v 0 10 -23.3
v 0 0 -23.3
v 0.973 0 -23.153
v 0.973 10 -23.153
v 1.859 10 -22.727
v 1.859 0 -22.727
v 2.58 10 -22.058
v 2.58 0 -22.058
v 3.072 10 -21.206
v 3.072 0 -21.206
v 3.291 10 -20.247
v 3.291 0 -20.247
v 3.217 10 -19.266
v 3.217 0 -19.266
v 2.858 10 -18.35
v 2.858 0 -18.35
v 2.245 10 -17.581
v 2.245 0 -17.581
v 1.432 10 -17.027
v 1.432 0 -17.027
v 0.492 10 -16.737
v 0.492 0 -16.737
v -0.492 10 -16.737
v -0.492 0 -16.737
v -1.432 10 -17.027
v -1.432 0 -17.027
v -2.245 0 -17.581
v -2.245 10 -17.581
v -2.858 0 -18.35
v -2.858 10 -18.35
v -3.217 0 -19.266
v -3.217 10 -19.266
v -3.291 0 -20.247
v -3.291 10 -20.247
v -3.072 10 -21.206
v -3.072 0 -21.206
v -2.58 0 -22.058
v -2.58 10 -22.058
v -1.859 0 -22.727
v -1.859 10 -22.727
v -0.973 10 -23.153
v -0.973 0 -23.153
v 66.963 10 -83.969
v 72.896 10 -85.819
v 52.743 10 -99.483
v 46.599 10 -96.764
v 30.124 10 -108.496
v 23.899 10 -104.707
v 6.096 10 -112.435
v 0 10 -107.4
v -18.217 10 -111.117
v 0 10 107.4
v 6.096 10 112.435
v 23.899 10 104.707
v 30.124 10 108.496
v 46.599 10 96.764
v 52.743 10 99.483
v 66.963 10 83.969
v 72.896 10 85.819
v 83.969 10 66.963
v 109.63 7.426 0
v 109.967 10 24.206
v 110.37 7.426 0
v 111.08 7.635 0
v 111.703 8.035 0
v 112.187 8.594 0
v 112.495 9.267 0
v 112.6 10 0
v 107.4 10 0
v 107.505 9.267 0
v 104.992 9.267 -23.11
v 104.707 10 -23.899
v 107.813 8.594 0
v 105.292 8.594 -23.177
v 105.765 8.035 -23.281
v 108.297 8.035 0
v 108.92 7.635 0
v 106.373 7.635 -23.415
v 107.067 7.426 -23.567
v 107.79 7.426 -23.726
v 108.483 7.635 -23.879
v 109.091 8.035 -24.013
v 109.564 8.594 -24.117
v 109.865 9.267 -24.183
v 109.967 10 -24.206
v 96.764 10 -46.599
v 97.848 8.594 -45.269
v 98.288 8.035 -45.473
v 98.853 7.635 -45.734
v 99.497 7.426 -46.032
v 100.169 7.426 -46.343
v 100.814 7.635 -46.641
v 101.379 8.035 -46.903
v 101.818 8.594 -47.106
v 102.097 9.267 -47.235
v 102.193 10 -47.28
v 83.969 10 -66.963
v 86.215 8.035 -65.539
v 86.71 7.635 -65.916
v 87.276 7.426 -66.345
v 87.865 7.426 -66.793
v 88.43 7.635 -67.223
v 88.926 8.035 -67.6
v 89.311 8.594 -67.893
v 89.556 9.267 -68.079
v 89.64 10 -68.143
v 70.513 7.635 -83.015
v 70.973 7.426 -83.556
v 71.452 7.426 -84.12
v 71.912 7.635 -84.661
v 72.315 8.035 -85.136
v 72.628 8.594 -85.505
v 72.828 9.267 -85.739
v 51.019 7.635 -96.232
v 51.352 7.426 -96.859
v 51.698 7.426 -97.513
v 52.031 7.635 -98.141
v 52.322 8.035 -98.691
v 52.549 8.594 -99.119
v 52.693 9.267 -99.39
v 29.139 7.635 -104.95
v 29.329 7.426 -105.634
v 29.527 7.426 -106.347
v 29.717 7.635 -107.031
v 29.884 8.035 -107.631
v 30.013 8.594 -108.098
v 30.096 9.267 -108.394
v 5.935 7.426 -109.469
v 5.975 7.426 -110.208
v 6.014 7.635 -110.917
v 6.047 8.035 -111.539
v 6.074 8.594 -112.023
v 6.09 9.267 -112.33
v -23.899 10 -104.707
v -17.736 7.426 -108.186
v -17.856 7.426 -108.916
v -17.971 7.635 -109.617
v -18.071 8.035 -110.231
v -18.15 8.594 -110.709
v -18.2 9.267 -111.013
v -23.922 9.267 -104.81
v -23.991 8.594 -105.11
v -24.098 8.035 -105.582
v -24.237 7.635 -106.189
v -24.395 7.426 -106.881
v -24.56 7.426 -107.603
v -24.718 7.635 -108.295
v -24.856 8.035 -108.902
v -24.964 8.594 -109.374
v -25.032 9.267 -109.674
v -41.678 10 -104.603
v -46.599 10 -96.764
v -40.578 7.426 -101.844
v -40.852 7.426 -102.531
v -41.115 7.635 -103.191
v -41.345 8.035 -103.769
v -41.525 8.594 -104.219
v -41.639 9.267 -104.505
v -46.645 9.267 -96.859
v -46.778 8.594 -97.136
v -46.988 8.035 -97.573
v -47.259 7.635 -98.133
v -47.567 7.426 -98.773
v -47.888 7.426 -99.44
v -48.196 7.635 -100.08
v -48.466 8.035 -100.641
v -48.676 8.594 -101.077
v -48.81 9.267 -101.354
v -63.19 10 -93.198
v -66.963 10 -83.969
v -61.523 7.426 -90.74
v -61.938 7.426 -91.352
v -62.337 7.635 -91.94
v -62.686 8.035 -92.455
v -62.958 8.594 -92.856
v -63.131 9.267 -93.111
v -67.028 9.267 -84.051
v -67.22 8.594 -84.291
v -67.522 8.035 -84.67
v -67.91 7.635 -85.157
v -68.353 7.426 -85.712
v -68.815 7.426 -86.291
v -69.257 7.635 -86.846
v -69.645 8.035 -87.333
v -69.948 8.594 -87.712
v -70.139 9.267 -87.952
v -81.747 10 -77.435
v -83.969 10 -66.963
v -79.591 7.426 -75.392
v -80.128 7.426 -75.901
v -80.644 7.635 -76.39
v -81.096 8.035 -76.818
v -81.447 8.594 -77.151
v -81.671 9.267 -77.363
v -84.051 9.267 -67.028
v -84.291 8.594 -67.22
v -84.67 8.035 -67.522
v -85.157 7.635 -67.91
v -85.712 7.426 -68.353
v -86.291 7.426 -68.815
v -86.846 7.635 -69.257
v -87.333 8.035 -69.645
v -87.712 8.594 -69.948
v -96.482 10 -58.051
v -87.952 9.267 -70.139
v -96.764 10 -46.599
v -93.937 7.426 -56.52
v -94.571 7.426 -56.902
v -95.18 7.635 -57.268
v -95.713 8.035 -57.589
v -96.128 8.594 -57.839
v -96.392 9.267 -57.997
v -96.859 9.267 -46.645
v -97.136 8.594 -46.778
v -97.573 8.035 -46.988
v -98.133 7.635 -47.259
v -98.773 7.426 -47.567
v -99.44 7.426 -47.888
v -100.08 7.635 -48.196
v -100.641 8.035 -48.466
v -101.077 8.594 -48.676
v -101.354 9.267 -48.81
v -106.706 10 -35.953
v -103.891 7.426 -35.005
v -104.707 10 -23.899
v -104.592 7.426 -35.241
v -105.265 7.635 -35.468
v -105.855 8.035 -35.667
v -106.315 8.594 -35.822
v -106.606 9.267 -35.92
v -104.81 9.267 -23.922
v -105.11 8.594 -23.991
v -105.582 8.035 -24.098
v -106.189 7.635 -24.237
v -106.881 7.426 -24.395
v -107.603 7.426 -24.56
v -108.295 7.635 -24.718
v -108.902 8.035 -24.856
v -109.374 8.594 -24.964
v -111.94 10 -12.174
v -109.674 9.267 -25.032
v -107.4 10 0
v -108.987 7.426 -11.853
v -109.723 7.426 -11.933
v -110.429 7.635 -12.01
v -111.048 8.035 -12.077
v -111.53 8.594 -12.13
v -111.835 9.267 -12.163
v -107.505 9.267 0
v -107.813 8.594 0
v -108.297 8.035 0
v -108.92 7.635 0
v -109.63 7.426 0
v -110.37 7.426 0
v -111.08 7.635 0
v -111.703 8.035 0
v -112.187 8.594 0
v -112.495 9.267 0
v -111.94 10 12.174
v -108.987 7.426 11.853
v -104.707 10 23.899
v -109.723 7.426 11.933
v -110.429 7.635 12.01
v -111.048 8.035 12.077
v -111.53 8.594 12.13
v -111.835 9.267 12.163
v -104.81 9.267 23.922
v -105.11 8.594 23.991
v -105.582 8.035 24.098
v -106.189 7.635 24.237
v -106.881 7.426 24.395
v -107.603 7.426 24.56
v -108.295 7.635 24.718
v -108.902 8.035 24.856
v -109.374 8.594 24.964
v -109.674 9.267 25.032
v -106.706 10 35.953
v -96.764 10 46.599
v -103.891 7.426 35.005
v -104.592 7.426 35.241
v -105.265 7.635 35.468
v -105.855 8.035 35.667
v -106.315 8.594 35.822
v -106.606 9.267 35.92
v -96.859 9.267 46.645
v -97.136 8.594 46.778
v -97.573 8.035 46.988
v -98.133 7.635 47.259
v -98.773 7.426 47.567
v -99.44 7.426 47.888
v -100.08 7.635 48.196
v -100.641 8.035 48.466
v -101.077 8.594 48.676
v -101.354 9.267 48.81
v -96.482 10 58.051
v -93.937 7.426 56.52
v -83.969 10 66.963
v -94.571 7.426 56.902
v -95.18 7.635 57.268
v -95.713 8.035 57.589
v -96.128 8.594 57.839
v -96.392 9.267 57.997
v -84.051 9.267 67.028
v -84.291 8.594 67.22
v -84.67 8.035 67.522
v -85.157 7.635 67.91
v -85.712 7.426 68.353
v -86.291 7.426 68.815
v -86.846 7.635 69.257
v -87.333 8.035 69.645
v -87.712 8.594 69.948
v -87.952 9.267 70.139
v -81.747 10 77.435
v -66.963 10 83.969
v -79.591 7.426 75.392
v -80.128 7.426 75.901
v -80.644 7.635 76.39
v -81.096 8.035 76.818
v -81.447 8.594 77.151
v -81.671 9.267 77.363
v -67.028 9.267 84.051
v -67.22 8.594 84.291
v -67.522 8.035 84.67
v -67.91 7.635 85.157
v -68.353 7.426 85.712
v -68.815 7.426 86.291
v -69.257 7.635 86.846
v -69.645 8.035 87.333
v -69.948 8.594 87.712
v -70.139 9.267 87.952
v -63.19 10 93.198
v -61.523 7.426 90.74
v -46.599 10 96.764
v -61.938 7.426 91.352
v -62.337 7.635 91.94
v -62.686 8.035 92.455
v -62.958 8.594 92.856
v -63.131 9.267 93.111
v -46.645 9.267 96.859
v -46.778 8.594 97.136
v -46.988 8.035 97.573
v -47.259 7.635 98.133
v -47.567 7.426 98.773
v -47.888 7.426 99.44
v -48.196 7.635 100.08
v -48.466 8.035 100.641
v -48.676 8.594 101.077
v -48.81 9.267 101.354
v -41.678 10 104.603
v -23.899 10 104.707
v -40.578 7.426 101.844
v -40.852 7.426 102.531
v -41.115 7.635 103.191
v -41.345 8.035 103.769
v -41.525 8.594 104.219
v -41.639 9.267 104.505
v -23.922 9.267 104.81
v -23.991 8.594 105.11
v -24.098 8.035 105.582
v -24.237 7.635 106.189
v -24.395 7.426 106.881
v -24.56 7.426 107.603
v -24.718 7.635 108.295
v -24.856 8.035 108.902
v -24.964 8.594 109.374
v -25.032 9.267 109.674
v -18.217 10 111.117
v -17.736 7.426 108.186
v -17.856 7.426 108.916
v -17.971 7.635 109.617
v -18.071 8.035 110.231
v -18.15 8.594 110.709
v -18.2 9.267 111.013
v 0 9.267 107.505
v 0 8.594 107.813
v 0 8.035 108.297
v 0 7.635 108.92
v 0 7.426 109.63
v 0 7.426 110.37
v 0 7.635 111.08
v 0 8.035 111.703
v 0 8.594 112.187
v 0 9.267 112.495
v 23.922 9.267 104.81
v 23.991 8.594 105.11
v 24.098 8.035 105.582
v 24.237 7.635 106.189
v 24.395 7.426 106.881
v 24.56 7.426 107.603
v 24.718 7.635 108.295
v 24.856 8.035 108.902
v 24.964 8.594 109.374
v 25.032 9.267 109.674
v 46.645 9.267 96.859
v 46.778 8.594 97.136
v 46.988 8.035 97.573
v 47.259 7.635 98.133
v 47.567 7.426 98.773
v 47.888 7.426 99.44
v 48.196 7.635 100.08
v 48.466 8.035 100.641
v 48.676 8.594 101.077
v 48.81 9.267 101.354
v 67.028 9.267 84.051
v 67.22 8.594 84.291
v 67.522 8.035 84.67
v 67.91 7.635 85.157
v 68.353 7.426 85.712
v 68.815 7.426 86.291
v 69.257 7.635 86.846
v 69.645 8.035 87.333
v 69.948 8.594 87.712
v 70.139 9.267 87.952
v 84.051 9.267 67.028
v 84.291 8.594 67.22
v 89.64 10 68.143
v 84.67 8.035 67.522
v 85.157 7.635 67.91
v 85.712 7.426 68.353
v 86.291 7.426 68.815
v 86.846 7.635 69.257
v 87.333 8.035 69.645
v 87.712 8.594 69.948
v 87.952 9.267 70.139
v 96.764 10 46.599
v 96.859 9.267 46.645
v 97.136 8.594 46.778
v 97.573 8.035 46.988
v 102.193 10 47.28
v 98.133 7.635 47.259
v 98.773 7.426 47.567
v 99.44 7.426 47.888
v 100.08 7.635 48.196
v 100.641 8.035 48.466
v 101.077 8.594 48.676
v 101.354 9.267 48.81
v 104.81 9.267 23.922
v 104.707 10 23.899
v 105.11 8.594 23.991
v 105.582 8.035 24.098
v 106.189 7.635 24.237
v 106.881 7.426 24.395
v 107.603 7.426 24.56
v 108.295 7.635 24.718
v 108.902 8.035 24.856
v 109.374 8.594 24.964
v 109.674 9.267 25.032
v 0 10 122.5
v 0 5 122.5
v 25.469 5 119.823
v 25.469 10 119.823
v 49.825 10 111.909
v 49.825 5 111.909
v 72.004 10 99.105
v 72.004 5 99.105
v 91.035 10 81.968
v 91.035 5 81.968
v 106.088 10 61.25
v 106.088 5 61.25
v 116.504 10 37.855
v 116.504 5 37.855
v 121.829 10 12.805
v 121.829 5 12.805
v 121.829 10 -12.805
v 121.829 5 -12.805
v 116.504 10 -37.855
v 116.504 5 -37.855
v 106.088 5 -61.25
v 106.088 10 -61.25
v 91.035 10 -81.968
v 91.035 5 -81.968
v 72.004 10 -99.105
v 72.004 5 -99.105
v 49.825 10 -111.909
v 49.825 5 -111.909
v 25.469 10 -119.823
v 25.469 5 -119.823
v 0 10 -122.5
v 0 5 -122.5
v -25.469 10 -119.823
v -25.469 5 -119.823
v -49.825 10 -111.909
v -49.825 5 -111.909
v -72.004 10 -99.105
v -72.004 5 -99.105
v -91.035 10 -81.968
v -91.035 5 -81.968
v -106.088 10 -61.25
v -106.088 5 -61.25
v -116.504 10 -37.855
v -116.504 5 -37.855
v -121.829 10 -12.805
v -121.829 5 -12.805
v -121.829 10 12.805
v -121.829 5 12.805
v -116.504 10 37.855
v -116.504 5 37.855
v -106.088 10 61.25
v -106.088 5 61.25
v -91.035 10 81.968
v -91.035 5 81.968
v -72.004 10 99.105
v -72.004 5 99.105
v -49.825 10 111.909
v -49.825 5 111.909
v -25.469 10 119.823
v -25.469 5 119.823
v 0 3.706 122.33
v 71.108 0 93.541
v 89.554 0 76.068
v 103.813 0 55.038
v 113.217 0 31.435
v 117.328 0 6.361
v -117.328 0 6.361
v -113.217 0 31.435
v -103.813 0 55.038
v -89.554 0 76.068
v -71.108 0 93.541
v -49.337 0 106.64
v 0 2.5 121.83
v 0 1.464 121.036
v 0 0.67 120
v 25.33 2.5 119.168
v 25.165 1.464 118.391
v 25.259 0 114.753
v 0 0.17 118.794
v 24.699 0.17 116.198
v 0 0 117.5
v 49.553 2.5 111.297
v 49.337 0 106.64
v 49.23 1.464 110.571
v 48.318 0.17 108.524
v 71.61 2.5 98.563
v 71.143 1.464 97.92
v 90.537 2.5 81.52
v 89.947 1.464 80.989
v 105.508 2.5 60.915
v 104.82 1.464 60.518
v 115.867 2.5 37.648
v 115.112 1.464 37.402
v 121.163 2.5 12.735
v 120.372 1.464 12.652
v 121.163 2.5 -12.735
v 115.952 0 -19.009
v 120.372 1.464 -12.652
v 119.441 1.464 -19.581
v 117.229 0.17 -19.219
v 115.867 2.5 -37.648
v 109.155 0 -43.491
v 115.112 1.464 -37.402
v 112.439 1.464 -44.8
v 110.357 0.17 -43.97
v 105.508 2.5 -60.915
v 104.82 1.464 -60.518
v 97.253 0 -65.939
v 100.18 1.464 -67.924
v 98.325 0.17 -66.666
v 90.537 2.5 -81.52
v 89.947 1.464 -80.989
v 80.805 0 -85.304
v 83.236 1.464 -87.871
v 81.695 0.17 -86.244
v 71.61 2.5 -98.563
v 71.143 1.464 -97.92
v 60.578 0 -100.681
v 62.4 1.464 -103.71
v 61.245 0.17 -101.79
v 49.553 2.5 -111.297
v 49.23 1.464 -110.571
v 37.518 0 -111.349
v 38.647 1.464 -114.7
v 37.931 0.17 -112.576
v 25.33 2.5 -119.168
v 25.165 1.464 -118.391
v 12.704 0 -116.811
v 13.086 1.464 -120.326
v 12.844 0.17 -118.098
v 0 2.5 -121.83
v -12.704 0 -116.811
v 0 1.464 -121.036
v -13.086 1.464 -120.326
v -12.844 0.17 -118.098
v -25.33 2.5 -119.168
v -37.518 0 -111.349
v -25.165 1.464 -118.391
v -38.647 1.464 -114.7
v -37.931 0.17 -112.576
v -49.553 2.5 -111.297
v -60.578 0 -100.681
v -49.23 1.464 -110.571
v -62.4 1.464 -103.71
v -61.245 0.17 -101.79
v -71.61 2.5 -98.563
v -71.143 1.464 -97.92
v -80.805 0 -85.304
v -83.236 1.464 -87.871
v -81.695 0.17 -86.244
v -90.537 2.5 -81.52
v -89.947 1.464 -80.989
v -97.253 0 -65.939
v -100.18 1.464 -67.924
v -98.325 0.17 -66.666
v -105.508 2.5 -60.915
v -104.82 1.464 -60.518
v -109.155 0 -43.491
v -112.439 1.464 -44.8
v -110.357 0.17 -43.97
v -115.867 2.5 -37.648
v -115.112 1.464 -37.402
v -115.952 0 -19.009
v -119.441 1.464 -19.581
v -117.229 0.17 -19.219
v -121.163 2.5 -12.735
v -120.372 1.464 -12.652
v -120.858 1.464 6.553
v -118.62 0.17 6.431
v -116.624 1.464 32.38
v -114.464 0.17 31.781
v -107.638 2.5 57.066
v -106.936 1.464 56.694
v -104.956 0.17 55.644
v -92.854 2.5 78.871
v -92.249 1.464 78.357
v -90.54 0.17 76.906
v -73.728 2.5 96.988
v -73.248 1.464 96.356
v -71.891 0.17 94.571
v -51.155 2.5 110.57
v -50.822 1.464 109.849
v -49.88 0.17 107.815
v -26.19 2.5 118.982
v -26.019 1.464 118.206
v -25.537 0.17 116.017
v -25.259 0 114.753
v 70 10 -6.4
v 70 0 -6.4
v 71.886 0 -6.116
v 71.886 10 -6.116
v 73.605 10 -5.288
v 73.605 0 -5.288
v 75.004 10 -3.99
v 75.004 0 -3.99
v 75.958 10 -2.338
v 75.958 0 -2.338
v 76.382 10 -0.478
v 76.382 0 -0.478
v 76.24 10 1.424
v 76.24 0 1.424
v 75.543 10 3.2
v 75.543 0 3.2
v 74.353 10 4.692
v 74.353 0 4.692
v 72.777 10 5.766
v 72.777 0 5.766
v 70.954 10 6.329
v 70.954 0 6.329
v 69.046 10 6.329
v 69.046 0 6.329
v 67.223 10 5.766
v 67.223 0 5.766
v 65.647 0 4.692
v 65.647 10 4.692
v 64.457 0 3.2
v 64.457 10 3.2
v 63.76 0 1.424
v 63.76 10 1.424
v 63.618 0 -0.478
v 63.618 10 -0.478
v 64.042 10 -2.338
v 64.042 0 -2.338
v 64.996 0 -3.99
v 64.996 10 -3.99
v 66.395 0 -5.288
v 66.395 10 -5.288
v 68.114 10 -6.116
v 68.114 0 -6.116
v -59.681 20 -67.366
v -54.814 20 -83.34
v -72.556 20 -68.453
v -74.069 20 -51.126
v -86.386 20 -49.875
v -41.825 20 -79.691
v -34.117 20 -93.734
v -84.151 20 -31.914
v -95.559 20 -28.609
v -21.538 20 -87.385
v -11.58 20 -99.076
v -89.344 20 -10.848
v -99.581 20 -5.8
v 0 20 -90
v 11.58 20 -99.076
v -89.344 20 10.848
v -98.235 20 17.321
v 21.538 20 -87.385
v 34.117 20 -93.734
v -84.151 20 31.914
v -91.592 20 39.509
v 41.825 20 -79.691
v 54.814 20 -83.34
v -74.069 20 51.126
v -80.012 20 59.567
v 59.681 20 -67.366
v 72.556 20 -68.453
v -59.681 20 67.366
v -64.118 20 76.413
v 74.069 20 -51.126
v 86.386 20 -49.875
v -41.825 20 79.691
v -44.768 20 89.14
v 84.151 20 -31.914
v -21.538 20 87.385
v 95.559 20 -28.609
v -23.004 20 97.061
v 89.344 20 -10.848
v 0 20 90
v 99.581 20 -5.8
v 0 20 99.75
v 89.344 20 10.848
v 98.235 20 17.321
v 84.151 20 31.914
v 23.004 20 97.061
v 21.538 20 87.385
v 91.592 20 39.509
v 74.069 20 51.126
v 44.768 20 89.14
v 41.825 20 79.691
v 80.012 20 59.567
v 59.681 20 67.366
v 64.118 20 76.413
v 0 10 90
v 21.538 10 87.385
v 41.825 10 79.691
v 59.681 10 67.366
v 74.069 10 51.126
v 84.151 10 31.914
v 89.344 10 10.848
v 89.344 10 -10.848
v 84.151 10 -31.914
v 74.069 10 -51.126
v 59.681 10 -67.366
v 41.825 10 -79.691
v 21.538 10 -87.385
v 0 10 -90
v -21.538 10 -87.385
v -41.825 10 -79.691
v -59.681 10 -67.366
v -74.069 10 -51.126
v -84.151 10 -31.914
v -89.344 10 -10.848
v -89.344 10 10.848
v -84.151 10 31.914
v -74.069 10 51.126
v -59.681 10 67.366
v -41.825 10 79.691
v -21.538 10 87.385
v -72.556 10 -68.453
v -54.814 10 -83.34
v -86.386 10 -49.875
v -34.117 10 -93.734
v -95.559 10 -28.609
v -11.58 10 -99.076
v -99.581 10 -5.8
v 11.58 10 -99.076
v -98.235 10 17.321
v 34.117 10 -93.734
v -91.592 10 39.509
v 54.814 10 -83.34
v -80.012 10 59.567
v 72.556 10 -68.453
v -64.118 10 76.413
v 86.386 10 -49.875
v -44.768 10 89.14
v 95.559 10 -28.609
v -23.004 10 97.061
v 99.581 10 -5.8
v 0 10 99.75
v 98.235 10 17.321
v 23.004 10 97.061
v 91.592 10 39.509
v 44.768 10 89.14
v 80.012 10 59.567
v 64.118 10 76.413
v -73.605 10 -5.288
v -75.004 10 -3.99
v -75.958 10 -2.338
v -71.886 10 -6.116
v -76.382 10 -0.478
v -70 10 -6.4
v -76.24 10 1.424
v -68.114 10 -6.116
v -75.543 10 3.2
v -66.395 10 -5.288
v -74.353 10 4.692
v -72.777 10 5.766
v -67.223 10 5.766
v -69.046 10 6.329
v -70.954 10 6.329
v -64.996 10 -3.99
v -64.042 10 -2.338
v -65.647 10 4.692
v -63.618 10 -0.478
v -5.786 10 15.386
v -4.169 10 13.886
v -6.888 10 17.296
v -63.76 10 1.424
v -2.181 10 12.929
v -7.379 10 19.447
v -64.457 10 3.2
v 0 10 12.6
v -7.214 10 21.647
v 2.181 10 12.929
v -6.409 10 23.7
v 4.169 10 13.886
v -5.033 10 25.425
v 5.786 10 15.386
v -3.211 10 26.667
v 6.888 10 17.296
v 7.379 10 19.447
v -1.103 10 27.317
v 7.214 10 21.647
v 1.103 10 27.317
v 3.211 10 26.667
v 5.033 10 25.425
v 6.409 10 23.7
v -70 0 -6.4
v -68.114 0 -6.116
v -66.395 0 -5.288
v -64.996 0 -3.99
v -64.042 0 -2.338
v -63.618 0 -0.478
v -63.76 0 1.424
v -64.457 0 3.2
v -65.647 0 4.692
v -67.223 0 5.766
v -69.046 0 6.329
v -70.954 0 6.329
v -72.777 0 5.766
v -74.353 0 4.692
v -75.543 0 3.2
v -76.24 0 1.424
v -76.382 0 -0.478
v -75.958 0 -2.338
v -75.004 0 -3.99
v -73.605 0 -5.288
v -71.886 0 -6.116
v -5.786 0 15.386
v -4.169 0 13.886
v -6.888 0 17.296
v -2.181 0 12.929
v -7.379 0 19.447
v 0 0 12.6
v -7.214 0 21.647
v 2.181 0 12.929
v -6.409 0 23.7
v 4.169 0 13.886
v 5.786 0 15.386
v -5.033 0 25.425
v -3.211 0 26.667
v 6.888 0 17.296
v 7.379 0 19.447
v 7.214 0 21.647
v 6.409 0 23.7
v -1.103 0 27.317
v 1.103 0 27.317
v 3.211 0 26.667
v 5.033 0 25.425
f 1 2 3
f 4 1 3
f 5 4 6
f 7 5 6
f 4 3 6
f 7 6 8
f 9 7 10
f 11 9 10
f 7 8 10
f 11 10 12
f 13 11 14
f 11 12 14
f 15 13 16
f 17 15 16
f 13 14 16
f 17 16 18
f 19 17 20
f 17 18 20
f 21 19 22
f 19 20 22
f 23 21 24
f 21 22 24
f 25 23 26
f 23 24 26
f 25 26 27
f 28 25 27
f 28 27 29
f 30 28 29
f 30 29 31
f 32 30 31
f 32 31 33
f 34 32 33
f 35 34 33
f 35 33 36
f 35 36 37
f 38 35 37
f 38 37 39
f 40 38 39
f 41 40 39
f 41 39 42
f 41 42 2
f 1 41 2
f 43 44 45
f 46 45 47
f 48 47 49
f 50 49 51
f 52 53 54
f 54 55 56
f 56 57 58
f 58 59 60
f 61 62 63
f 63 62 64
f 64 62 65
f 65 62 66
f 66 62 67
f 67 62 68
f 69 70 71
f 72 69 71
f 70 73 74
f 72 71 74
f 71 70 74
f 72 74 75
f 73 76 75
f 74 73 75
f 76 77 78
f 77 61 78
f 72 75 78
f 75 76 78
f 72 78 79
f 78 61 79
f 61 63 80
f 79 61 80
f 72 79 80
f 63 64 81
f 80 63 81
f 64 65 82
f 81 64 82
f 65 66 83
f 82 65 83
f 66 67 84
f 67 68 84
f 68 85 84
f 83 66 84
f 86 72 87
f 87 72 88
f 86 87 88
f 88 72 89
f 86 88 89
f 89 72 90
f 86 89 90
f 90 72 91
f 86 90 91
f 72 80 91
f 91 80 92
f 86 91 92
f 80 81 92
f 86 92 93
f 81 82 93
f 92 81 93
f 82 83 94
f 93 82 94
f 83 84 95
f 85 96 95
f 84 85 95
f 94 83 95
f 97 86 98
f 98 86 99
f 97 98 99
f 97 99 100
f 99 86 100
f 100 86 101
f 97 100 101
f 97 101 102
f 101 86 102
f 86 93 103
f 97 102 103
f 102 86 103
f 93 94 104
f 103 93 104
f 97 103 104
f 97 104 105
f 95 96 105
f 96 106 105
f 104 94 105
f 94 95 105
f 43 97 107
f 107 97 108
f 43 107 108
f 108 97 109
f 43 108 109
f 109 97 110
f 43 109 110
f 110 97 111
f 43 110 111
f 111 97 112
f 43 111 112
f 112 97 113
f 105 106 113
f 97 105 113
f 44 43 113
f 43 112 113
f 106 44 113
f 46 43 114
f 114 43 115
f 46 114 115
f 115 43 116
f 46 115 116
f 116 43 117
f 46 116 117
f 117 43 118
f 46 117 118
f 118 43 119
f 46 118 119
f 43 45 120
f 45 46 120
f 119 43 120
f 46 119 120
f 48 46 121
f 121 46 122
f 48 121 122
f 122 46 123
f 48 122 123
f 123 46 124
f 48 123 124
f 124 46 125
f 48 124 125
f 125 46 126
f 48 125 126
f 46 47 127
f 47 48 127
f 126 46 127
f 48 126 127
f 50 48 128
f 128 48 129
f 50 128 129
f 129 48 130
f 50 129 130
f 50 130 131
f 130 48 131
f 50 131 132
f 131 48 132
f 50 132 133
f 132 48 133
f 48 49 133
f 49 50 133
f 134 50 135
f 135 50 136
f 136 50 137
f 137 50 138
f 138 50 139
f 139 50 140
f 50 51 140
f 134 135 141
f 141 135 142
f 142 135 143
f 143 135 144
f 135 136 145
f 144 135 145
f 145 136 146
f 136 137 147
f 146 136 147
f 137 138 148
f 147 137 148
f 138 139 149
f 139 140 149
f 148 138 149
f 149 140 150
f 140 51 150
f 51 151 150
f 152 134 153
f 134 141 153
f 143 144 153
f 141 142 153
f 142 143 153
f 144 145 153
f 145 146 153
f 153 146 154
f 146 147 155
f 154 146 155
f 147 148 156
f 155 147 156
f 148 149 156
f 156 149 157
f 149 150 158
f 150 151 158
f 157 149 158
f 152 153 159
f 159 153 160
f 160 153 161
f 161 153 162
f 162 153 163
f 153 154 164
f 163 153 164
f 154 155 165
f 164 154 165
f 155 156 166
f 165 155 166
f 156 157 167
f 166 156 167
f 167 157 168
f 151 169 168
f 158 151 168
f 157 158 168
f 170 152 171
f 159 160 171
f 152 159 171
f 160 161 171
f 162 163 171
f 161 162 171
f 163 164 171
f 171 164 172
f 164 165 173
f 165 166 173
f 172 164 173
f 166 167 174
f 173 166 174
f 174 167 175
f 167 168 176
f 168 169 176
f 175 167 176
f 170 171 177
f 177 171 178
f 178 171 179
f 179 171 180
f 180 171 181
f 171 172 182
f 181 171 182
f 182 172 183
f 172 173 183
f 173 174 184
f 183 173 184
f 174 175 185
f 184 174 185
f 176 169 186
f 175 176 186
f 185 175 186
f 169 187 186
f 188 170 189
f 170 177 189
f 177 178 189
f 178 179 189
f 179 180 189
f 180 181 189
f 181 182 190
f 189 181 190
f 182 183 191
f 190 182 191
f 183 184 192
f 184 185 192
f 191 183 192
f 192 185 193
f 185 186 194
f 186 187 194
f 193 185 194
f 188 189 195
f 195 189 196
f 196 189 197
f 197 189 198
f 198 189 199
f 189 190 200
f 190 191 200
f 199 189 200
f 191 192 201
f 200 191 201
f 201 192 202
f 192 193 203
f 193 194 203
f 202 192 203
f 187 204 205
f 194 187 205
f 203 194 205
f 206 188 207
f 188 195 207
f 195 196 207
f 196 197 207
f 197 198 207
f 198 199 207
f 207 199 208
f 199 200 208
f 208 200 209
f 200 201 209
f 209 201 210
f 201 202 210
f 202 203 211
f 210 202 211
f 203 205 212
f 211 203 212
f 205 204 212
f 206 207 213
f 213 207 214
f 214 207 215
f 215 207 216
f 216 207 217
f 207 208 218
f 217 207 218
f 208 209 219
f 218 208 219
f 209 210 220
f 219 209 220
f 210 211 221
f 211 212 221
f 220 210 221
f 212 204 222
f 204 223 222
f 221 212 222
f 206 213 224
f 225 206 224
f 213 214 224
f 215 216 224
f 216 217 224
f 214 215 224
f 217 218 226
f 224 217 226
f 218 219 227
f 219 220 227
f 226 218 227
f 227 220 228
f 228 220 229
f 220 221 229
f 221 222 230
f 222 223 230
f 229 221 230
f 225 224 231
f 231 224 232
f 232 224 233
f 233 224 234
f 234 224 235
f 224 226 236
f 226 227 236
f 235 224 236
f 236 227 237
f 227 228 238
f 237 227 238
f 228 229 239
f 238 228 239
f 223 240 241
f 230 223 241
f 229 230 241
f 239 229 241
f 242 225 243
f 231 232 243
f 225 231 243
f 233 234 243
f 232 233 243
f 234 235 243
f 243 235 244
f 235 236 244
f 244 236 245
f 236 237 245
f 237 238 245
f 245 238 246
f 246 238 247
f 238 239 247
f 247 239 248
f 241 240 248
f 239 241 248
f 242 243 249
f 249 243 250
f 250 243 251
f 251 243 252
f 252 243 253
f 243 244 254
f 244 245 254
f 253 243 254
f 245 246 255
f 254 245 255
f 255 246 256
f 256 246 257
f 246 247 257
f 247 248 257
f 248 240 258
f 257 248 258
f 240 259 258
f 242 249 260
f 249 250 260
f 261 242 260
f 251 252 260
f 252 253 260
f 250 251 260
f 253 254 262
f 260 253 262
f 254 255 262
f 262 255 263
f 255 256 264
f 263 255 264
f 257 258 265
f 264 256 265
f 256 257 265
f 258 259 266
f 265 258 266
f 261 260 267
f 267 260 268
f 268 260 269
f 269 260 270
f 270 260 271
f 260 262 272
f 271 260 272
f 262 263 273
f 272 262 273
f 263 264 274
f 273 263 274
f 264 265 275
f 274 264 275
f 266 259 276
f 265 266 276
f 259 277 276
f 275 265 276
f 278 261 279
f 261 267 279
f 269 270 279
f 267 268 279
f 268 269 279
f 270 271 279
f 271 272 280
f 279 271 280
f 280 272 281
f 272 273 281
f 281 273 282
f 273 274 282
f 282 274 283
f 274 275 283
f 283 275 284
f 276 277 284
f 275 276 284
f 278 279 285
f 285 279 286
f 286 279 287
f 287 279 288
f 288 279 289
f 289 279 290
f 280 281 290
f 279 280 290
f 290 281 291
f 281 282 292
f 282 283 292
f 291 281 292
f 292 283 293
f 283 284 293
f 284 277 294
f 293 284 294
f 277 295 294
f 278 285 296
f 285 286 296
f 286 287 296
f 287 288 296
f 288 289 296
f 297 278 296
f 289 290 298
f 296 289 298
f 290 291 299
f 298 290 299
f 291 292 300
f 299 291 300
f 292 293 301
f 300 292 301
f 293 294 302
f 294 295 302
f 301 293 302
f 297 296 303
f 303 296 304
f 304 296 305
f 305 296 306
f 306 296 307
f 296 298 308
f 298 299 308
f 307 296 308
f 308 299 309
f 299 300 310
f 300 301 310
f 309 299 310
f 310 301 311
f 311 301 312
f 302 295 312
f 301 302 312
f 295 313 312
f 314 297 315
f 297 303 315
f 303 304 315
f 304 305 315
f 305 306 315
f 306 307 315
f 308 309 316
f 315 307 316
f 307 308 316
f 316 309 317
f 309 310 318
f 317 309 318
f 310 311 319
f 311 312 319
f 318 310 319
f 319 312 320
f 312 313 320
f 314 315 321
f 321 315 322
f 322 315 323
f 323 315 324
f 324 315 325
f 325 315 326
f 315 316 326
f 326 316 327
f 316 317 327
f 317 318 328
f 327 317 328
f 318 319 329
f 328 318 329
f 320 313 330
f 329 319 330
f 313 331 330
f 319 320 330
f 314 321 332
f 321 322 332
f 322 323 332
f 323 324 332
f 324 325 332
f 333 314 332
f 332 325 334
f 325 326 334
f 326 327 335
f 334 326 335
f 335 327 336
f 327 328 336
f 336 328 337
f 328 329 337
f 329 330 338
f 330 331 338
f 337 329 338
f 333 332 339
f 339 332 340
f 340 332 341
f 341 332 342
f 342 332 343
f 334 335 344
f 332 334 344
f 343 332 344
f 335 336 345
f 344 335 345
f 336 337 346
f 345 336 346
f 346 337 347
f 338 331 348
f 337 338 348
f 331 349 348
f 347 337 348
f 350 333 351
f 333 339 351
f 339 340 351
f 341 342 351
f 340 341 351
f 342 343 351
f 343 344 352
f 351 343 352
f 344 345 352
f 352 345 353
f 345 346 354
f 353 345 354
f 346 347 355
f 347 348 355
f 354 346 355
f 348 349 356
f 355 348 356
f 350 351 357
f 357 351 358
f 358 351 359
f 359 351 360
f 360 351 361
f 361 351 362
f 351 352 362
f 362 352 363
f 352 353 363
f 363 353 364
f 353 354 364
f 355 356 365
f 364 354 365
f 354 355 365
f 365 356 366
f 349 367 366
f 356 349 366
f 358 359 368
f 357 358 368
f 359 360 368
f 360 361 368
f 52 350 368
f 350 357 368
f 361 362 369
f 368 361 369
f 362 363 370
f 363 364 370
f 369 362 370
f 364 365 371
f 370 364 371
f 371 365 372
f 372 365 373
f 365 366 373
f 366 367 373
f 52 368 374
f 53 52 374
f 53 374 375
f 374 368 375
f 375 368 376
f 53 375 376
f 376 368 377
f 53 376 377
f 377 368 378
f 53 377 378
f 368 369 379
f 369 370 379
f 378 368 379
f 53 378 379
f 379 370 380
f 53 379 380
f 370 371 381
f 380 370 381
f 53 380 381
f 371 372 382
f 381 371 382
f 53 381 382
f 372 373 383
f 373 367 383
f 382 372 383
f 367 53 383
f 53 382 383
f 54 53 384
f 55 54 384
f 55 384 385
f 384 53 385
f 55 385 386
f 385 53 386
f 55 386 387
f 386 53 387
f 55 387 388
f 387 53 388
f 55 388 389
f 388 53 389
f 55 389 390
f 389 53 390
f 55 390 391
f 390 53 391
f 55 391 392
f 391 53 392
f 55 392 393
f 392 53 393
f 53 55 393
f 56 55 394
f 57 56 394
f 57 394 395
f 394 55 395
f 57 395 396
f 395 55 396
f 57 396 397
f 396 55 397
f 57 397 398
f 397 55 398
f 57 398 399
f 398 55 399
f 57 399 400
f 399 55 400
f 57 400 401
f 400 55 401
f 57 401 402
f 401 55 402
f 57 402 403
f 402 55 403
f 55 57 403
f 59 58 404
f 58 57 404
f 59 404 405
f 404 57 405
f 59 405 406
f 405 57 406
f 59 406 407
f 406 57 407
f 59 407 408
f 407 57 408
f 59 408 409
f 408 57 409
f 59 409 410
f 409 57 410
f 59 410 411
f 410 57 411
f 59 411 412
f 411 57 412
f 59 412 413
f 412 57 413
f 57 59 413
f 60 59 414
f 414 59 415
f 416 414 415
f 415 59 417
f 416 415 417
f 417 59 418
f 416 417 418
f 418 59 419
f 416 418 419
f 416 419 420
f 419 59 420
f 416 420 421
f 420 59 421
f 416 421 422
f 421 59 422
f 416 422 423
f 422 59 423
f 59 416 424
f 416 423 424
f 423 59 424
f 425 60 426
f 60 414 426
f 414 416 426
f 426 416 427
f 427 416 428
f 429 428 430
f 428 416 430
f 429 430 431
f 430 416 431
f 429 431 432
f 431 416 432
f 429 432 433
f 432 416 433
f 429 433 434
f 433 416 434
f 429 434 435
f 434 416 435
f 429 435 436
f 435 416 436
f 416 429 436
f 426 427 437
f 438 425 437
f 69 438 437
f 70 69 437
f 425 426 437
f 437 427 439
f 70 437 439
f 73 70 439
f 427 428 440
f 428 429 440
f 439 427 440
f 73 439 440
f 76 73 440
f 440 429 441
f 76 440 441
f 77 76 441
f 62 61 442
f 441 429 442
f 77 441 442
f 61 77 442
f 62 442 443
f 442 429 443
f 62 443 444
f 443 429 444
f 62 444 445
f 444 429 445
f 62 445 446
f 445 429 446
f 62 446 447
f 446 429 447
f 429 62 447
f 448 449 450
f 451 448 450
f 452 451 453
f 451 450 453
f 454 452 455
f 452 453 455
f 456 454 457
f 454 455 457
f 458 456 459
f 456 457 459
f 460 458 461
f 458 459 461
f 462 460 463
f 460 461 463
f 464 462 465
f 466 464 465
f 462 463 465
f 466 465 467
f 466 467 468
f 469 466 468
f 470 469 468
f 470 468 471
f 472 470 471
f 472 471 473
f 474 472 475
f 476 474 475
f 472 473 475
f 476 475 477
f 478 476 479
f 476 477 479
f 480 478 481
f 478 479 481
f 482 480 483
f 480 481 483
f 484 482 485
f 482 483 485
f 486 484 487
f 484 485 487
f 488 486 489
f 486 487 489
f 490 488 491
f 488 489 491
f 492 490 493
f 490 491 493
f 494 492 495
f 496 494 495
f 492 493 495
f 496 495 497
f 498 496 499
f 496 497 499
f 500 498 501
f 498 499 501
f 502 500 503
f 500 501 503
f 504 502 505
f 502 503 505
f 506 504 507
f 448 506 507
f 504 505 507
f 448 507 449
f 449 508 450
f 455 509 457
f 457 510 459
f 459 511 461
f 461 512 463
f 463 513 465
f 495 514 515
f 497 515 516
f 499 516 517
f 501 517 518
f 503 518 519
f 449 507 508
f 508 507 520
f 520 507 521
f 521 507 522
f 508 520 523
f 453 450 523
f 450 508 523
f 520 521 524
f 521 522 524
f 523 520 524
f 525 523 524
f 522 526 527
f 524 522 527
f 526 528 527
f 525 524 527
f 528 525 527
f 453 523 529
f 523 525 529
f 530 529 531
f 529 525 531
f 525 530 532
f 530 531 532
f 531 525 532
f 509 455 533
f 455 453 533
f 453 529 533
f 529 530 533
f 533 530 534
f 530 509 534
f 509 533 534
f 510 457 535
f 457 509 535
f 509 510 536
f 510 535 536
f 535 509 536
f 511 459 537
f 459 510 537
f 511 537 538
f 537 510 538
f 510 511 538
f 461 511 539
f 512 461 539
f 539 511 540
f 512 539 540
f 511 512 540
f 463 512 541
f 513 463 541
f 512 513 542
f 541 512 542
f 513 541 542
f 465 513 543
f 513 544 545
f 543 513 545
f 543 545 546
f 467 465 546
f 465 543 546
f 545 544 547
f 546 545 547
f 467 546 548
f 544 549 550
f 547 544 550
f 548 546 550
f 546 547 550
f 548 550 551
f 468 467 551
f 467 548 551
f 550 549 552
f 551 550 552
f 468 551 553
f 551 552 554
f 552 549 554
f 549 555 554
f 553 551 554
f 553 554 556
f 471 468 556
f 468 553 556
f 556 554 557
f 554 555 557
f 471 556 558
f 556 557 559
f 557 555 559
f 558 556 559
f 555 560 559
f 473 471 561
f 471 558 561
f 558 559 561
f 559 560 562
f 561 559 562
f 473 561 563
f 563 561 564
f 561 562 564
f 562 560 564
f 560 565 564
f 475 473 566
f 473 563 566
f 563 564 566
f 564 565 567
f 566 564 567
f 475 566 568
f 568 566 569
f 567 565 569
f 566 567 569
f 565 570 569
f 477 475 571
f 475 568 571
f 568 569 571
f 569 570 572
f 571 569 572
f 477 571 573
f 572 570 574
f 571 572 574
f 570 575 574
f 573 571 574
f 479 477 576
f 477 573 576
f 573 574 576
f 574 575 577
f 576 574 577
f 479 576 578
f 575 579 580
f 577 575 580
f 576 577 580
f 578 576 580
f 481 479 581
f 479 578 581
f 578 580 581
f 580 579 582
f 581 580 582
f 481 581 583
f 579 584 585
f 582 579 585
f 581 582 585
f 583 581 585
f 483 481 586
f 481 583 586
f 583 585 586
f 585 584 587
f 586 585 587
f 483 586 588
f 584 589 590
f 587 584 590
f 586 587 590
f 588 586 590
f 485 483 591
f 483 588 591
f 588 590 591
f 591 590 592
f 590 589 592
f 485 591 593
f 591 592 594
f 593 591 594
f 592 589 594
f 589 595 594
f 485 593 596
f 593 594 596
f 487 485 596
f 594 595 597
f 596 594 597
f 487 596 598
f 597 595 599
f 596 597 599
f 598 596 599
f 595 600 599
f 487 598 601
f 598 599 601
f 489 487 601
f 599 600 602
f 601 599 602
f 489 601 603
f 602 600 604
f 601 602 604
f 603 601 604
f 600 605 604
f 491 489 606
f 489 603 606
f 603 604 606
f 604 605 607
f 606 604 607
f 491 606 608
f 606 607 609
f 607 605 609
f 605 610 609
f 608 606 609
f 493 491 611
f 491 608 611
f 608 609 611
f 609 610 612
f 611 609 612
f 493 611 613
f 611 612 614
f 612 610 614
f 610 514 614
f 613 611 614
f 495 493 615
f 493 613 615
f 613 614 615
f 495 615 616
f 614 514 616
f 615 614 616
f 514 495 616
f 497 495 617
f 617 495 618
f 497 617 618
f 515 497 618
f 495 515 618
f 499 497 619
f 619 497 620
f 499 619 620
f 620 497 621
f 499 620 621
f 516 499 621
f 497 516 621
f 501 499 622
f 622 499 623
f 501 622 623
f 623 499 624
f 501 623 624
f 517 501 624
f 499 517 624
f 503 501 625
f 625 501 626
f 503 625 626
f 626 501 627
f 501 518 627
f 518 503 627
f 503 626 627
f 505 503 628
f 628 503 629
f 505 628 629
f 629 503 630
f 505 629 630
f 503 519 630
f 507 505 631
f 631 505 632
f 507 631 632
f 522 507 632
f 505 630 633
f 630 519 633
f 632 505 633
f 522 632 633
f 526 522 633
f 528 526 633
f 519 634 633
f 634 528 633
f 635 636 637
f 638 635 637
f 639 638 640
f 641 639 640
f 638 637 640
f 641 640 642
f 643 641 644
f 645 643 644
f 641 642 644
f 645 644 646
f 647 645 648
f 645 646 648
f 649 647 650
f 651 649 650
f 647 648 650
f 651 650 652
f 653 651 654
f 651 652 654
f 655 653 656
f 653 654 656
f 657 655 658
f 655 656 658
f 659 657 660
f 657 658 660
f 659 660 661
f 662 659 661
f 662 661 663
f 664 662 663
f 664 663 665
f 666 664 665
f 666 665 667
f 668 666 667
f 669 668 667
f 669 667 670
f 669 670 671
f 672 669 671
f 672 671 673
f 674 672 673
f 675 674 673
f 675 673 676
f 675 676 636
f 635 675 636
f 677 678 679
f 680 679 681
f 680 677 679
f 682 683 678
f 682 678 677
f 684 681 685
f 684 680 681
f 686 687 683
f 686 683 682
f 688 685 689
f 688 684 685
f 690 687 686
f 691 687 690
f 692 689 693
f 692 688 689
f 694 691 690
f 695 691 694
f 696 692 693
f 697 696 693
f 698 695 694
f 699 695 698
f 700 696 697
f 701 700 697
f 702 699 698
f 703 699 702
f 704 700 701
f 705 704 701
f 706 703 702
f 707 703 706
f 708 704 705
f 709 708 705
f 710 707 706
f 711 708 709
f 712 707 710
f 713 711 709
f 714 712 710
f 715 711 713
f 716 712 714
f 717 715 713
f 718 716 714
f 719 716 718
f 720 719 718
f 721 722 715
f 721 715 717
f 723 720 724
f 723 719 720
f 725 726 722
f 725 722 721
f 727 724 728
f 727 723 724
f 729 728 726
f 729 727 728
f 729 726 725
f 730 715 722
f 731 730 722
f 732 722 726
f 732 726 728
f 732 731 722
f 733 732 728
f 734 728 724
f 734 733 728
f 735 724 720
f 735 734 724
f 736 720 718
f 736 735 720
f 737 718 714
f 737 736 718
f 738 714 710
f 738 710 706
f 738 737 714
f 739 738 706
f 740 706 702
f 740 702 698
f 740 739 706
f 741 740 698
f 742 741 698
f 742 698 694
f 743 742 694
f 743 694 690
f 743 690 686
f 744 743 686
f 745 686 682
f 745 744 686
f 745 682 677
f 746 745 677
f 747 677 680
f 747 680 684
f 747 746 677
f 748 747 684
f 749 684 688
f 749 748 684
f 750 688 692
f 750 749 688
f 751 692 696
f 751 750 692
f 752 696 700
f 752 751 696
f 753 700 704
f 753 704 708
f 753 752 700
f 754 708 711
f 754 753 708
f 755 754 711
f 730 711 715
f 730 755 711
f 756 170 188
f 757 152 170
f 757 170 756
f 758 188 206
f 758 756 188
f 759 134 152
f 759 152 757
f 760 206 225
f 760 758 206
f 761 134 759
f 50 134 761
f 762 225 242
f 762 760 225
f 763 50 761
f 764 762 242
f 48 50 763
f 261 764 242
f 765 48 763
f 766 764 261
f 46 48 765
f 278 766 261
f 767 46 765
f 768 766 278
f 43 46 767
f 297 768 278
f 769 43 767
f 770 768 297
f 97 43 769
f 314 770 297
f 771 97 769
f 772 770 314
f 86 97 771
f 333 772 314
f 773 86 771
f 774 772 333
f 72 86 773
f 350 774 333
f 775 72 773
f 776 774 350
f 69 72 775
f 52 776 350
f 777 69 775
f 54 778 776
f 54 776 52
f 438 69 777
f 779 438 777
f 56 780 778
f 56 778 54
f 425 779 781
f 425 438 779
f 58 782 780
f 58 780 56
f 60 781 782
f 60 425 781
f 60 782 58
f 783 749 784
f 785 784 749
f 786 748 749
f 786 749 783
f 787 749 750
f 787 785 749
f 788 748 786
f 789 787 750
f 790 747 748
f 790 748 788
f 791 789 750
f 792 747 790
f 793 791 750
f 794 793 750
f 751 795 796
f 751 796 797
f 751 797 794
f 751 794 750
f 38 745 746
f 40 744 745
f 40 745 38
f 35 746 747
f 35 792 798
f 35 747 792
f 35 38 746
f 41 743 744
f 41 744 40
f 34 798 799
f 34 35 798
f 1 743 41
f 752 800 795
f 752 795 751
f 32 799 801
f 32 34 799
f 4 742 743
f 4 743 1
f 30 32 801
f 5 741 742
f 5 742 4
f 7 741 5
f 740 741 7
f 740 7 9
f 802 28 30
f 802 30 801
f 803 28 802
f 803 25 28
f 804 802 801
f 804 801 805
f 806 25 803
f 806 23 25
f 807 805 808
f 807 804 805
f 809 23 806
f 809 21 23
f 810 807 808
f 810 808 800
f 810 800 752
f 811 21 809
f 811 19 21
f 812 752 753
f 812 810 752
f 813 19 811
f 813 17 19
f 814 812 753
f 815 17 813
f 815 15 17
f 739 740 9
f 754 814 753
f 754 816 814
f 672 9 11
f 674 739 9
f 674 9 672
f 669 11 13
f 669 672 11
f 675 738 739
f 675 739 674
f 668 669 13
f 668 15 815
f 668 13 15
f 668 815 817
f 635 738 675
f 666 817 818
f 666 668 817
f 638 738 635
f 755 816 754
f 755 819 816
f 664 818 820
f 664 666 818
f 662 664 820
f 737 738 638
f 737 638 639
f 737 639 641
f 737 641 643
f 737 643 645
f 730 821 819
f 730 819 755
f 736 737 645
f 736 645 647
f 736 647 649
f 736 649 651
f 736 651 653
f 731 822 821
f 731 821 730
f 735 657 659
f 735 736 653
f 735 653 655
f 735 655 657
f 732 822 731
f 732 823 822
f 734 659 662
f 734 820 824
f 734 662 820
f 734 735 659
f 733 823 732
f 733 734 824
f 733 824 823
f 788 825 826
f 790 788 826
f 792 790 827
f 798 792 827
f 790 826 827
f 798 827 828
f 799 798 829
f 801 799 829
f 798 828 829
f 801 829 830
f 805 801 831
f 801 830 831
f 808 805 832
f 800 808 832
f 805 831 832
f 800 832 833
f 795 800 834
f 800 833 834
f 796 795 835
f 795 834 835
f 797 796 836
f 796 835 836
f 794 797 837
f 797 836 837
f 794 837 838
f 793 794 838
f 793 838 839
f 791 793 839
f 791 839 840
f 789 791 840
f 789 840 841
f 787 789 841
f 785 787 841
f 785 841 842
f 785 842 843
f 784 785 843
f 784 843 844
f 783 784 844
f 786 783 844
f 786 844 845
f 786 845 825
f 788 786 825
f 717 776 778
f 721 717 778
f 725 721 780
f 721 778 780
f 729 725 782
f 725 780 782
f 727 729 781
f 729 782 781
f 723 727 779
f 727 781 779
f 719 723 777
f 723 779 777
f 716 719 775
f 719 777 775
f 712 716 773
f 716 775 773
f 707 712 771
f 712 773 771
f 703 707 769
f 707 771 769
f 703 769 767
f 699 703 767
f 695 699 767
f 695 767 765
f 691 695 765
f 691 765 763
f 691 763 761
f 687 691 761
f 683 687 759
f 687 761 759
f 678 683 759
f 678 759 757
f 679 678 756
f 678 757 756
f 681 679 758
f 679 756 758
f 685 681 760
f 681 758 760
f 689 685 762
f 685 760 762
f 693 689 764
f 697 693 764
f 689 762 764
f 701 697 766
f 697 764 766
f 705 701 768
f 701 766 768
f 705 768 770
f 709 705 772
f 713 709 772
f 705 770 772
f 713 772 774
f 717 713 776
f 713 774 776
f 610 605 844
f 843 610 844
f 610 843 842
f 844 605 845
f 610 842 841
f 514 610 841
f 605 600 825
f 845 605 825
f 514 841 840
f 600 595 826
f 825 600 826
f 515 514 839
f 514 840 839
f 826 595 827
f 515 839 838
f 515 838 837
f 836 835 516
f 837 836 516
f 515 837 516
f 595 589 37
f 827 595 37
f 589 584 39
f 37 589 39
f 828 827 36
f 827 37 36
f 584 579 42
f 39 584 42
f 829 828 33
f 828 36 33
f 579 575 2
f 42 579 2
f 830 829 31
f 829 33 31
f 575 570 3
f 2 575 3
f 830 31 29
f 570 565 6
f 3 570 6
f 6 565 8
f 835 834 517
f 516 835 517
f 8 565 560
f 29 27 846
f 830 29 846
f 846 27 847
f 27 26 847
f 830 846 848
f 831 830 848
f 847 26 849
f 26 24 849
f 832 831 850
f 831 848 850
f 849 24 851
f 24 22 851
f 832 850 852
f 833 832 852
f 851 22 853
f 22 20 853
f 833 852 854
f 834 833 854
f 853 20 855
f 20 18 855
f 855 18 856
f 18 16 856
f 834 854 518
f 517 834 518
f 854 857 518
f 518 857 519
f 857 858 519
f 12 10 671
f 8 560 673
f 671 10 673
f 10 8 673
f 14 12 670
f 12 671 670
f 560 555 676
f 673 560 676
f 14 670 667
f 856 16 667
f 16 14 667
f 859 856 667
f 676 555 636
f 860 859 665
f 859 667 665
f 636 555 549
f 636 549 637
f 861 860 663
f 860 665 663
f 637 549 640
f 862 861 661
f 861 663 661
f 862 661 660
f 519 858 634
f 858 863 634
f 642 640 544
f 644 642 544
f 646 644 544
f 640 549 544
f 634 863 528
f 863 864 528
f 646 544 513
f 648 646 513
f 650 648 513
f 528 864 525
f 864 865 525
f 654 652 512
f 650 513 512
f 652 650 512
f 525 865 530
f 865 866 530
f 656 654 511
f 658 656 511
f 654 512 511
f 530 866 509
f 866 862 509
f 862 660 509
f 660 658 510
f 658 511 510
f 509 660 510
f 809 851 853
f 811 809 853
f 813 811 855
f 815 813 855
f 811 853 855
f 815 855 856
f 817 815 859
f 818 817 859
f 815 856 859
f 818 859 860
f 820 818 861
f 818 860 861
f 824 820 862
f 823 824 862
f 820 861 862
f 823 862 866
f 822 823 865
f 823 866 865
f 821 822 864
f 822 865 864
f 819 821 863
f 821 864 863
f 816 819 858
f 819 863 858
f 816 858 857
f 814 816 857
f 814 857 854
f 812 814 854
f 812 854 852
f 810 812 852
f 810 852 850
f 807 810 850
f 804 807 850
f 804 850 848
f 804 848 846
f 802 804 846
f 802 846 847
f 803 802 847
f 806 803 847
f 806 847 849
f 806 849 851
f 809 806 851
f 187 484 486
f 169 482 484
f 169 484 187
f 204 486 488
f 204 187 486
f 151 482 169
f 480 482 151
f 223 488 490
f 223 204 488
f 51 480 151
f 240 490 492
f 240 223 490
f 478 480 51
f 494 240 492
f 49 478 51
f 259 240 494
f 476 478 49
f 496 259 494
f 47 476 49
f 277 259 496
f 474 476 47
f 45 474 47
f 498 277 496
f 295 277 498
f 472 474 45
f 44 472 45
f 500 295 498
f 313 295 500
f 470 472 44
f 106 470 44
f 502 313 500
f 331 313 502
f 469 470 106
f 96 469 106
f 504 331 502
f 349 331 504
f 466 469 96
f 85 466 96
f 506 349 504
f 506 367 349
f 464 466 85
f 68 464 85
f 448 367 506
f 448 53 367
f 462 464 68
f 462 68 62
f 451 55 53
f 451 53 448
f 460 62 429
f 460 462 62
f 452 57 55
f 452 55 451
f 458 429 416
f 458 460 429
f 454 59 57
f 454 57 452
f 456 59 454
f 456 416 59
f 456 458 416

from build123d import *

# Parameters (mm, degrees)
CROQUIS1_R              = 122.5
SALIENTE_EXTRUIR1_DEPTH = 10
CROQUIS4_R              = 2.6
CROQUIS5_R              = 99.75
CROQUIS5_R_2            = 90
SALIENTE_EXTRUIR3_DEPTH = 10
REDONDEO1_R             = 5
CROQUIS7_R              = 7.4
CROQUIS7_R_2            = 3.3
CROQUIS7_R_3            = 6.4
CORTAR_EXTRUIR1_DEPTH   = 175.391800266


with BuildPart() as part:
    # Croquis1 → Saliente-Extruir1 (new body)
    with BuildSketch(Plane(origin=(0, 0, 0), x_dir=(1, 0, 0), z_dir=(0, 1, 0))):
        with Locations(Location((0, 0, 0), (0, 0, 270))):
            Circle(CROQUIS1_R)
    extrude(amount=SALIENTE_EXTRUIR1_DEPTH)

    # Cortar-Barrer1: sweep along a path in Croquis3
    with BuildLine(Plane(origin=(0, 10, 0), x_dir=(1, 0, 0), z_dir=(0, 1, 0))) as cortar_barrer1_path:
        CenterArc((0, 0), 110, 0, 360)
    # Croquis4 → Cortar-Barrer1 (sweep, cut)
    with BuildSketch(Plane.XY):
        with Locations((-110, 10)):
            Circle(CROQUIS4_R)
    sweep(path=cortar_barrer1_path.line, mode=Mode.SUBTRACT)

    # Croquis5 → Saliente-Extruir3 (add)
    with BuildSketch(Plane(origin=(0, 10, 0), x_dir=(1, 0, 0), z_dir=(0, 1, 0))):
        with Locations(Location((0, 0, 0), (0, 0, 270))):
            Circle(CROQUIS5_R)
        with Locations(Location((0, 0, 0), (0, 0, 270))):
            Circle(CROQUIS5_R_2, mode=Mode.SUBTRACT)
    extrude(amount=SALIENTE_EXTRUIR3_DEPTH)

    # Redondeo1
    redondeo1_edges = [part.edges().sort_by_distance(p)[0] for p in [
        (0, 0, -122.5),
    ]]
    fillet(redondeo1_edges, radius=REDONDEO1_R)

    # Croquis7 → Cortar-Extruir1 (cut, through all)
    with BuildSketch(Plane.XZ):
        with Locations(Location((0, 20, 0), (0, 0, 270))):
            Circle(CROQUIS7_R)
        with Locations(Location((0, -20, 0), (0, 0, 270))):
            Circle(CROQUIS7_R_2)
        with Locations(Location((70, 0, 0), (0, 0, 270))):
            Circle(CROQUIS7_R_3)
        with Locations(Location((-70, 0, 0), (0, 0, 270))):
            Circle(CROQUIS7_R_3)
    extrude(amount=-CORTAR_EXTRUIR1_DEPTH, mode=Mode.SUBTRACT)


solid = part.part
